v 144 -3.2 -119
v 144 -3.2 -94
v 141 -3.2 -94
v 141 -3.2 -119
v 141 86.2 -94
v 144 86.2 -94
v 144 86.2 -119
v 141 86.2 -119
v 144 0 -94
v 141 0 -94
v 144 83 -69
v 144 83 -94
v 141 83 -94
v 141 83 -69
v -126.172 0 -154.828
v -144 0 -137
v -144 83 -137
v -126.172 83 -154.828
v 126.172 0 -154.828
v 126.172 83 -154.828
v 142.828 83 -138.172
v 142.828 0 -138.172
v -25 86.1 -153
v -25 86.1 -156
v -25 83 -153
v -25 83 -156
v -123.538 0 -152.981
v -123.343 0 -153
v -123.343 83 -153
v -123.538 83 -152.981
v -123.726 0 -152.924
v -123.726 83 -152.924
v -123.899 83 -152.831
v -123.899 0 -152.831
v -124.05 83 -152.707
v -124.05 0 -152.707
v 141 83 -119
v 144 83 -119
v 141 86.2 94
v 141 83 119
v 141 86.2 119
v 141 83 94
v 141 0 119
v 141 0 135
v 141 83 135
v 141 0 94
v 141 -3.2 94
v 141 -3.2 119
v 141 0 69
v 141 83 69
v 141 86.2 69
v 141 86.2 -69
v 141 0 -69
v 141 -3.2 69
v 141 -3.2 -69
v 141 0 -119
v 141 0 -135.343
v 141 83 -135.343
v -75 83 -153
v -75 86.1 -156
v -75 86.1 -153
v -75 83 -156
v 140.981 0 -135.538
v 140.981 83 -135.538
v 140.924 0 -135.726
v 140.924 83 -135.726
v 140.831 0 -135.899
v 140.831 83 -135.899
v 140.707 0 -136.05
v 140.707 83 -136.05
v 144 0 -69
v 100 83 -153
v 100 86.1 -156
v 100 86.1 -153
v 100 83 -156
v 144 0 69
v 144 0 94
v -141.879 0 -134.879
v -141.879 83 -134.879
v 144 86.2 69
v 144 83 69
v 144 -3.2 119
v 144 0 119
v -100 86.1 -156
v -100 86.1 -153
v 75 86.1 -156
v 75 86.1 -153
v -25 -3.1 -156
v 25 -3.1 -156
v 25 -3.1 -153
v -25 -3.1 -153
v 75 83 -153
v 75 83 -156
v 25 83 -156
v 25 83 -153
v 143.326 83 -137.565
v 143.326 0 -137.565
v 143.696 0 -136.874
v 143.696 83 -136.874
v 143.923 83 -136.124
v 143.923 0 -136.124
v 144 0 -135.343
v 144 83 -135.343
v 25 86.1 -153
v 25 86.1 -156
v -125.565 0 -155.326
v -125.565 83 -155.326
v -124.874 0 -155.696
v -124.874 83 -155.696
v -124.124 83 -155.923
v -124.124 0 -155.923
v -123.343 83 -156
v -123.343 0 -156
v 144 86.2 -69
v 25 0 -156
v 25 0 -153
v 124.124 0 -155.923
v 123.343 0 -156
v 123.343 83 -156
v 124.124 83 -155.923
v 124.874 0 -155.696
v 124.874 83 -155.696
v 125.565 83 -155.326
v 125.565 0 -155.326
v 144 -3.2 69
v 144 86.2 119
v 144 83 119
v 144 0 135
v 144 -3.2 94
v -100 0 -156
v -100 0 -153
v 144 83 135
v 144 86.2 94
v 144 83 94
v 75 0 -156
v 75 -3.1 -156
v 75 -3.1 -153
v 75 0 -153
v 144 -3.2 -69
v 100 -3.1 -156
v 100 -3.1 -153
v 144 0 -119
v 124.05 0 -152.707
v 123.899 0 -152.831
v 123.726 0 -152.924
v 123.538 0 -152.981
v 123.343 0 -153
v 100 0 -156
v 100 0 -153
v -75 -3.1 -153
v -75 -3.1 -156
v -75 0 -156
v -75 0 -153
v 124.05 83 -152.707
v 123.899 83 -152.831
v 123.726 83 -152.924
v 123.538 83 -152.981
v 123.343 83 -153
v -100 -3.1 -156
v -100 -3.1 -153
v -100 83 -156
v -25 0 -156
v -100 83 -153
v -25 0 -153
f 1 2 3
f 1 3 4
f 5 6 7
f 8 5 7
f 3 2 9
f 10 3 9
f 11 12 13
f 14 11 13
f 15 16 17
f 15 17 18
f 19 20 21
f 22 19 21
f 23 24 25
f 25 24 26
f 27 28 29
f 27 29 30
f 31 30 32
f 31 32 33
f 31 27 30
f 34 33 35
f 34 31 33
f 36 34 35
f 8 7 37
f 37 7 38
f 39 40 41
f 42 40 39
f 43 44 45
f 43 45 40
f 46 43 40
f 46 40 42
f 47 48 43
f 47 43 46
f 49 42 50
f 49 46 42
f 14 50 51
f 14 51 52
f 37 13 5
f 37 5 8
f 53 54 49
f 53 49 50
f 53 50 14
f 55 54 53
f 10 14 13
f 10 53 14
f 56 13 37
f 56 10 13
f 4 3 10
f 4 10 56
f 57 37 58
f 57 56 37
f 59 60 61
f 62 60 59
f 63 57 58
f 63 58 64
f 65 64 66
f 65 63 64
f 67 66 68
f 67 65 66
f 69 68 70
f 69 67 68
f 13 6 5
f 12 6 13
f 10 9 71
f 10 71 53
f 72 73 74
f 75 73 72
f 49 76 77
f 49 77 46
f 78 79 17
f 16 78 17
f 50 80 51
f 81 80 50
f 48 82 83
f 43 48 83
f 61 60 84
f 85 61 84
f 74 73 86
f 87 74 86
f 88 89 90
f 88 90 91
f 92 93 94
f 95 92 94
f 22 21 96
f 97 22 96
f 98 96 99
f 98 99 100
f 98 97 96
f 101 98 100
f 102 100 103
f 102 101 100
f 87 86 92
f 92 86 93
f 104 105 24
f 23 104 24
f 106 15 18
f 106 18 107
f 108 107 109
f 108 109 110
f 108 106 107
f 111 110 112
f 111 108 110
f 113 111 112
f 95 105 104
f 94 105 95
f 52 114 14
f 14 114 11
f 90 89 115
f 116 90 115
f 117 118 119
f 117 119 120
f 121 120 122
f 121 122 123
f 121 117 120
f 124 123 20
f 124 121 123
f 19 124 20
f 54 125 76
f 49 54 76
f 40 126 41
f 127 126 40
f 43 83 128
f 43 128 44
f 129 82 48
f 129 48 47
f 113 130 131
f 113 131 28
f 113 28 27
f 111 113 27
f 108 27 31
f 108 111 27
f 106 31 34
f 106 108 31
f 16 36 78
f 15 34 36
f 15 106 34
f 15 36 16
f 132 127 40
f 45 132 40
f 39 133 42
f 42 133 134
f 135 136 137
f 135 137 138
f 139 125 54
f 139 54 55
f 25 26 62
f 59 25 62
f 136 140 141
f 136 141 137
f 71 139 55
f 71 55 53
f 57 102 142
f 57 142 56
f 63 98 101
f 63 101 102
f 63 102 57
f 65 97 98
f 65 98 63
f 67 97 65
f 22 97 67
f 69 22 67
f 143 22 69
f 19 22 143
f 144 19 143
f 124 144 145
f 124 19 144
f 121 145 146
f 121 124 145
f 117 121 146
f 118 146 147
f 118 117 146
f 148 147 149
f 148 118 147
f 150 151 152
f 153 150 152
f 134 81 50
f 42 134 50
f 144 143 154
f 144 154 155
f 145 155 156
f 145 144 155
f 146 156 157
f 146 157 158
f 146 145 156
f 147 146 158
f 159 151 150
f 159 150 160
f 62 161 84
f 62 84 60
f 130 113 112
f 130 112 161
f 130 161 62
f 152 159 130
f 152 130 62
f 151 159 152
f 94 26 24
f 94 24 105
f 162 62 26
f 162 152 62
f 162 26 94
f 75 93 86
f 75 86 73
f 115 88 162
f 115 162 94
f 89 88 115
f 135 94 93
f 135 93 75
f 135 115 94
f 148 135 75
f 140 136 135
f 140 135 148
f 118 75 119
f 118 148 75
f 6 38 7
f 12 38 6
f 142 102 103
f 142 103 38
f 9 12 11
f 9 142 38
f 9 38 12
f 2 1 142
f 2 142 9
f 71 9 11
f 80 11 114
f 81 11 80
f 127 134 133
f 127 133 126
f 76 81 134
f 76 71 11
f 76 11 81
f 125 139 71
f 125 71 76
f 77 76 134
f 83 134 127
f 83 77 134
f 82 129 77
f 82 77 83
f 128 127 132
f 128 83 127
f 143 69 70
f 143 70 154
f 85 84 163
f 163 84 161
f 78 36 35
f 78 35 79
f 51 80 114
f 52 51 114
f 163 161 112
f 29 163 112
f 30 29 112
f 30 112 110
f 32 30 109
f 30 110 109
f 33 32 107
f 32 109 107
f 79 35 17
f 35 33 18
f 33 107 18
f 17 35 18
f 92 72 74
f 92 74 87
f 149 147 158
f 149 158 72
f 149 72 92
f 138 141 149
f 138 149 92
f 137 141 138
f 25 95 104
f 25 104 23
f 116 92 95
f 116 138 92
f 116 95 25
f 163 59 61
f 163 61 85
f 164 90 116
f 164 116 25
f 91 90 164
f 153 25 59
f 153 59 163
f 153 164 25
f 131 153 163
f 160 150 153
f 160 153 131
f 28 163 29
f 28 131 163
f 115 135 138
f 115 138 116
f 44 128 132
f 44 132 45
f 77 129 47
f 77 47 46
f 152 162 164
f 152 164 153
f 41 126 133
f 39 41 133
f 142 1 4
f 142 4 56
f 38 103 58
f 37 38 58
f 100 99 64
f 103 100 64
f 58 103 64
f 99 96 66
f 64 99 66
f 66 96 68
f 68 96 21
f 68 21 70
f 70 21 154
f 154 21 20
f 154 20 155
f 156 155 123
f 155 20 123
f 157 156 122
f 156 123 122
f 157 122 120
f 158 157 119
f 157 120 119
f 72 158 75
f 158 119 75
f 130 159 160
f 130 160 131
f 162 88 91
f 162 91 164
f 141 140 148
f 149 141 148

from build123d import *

# Parameters (mm, degrees)
BASE_FLANGE1_DEPTH  = 83
SKETCH2_W           = 50
SKETCH2_H           = 3.1
SKETCH2_W_2         = 25
BOSS_EXTRUDE1_DEPTH = 3
SKETCH3_W           = 138
SKETCH3_H           = 3.2
SKETCH3_W_2         = 25
BOSS_EXTRUDE2_DEPTH = 3


# Sheet-metal steps are written as plain solids
with BuildPart() as part:
    # Sketch1 → Base-Flange1 (new body)
    with BuildSketch(Plane(origin=(0, 0, 0), x_dir=(1, 0, 0), z_dir=(0, 1, 0))):
        with BuildLine():
            Line((-144, 137), (-126.171572875, 154.828427125))
            ThreePointArc((-126.171572875, 154.828427125), (-124.87387948, 155.69551813), (-123.343145751, 156))
            Line((-123.343145751, 156), (123.343145751, 156))
            ThreePointArc((123.343145751, 156), (124.87387948, 155.69551813), (126.171572875, 154.828427125))
            Line((126.171572875, 154.828427125), (142.828427125, 138.171572875))
            ThreePointArc((142.828427125, 138.171572875), (143.69551813, 136.87387948), (144, 135.343145751))
            Line((144, 135.343145751), (144, -135))
            Line((144, -135), (141, -135))
            Line((141, -135), (141, 135.343145751))
            ThreePointArc((141, 135.343145751), (140.923879533, 135.725829183), (140.707106781, 136.050252532))
            Line((140.707106781, 136.050252532), (124.050252532, 152.707106781))
            ThreePointArc((124.050252532, 152.707106781), (123.725829183, 152.923879533), (123.343145751, 153))
            Line((123.343145751, 153), (-123.343145751, 153))
            ThreePointArc((-123.343145751, 153), (-123.725829183, 152.923879533), (-124.050252532, 152.707106781))
            Line((-124.050252532, 152.707106781), (-141.878679656, 134.878679656))
            Line((-141.878679656, 134.878679656), (-144, 137))
        make_face()
    extrude(amount=BASE_FLANGE1_DEPTH)

    # Sketch2 → Boss-Extrude1 (add)
    with BuildSketch(Plane(origin=(0, 0, -156), x_dir=(-1, 0, 0), z_dir=(0, 0, -1))):
        with Locations((0, -1.55)):
            Rectangle(SKETCH2_W, SKETCH2_H)
        with Locations((-87.5, -1.55)):
            Rectangle(SKETCH2_W_2, SKETCH2_H)
        with Locations((87.5, -1.55)):
            Rectangle(SKETCH2_W_2, SKETCH2_H)
    boss_extrude1 = extrude(amount=-BOSS_EXTRUDE1_DEPTH)

    # Sketch3 → Boss-Extrude2 (add)
    with BuildSketch(Plane(origin=(144, 0, 0), x_dir=(0, 0, -1), z_dir=(1, 0, 0))):
        with Locations((0, -1.6)):
            Rectangle(SKETCH3_W, SKETCH3_H)
        with Locations((106.5, -1.6)):
            Rectangle(SKETCH3_W_2, SKETCH3_H)
        with Locations((-106.5, -1.6)):
            Rectangle(SKETCH3_W_2, SKETCH3_H)
    boss_extrude2 = extrude(amount=-BOSS_EXTRUDE2_DEPTH)

    # Mirror1: Boss-Extrude1, Boss-Extrude2 across plane
    add(boss_extrude1.mirror(Plane.ZX.offset(41.5)))
    add(boss_extrude2.mirror(Plane.ZX.offset(41.5)))


solid = part.part
